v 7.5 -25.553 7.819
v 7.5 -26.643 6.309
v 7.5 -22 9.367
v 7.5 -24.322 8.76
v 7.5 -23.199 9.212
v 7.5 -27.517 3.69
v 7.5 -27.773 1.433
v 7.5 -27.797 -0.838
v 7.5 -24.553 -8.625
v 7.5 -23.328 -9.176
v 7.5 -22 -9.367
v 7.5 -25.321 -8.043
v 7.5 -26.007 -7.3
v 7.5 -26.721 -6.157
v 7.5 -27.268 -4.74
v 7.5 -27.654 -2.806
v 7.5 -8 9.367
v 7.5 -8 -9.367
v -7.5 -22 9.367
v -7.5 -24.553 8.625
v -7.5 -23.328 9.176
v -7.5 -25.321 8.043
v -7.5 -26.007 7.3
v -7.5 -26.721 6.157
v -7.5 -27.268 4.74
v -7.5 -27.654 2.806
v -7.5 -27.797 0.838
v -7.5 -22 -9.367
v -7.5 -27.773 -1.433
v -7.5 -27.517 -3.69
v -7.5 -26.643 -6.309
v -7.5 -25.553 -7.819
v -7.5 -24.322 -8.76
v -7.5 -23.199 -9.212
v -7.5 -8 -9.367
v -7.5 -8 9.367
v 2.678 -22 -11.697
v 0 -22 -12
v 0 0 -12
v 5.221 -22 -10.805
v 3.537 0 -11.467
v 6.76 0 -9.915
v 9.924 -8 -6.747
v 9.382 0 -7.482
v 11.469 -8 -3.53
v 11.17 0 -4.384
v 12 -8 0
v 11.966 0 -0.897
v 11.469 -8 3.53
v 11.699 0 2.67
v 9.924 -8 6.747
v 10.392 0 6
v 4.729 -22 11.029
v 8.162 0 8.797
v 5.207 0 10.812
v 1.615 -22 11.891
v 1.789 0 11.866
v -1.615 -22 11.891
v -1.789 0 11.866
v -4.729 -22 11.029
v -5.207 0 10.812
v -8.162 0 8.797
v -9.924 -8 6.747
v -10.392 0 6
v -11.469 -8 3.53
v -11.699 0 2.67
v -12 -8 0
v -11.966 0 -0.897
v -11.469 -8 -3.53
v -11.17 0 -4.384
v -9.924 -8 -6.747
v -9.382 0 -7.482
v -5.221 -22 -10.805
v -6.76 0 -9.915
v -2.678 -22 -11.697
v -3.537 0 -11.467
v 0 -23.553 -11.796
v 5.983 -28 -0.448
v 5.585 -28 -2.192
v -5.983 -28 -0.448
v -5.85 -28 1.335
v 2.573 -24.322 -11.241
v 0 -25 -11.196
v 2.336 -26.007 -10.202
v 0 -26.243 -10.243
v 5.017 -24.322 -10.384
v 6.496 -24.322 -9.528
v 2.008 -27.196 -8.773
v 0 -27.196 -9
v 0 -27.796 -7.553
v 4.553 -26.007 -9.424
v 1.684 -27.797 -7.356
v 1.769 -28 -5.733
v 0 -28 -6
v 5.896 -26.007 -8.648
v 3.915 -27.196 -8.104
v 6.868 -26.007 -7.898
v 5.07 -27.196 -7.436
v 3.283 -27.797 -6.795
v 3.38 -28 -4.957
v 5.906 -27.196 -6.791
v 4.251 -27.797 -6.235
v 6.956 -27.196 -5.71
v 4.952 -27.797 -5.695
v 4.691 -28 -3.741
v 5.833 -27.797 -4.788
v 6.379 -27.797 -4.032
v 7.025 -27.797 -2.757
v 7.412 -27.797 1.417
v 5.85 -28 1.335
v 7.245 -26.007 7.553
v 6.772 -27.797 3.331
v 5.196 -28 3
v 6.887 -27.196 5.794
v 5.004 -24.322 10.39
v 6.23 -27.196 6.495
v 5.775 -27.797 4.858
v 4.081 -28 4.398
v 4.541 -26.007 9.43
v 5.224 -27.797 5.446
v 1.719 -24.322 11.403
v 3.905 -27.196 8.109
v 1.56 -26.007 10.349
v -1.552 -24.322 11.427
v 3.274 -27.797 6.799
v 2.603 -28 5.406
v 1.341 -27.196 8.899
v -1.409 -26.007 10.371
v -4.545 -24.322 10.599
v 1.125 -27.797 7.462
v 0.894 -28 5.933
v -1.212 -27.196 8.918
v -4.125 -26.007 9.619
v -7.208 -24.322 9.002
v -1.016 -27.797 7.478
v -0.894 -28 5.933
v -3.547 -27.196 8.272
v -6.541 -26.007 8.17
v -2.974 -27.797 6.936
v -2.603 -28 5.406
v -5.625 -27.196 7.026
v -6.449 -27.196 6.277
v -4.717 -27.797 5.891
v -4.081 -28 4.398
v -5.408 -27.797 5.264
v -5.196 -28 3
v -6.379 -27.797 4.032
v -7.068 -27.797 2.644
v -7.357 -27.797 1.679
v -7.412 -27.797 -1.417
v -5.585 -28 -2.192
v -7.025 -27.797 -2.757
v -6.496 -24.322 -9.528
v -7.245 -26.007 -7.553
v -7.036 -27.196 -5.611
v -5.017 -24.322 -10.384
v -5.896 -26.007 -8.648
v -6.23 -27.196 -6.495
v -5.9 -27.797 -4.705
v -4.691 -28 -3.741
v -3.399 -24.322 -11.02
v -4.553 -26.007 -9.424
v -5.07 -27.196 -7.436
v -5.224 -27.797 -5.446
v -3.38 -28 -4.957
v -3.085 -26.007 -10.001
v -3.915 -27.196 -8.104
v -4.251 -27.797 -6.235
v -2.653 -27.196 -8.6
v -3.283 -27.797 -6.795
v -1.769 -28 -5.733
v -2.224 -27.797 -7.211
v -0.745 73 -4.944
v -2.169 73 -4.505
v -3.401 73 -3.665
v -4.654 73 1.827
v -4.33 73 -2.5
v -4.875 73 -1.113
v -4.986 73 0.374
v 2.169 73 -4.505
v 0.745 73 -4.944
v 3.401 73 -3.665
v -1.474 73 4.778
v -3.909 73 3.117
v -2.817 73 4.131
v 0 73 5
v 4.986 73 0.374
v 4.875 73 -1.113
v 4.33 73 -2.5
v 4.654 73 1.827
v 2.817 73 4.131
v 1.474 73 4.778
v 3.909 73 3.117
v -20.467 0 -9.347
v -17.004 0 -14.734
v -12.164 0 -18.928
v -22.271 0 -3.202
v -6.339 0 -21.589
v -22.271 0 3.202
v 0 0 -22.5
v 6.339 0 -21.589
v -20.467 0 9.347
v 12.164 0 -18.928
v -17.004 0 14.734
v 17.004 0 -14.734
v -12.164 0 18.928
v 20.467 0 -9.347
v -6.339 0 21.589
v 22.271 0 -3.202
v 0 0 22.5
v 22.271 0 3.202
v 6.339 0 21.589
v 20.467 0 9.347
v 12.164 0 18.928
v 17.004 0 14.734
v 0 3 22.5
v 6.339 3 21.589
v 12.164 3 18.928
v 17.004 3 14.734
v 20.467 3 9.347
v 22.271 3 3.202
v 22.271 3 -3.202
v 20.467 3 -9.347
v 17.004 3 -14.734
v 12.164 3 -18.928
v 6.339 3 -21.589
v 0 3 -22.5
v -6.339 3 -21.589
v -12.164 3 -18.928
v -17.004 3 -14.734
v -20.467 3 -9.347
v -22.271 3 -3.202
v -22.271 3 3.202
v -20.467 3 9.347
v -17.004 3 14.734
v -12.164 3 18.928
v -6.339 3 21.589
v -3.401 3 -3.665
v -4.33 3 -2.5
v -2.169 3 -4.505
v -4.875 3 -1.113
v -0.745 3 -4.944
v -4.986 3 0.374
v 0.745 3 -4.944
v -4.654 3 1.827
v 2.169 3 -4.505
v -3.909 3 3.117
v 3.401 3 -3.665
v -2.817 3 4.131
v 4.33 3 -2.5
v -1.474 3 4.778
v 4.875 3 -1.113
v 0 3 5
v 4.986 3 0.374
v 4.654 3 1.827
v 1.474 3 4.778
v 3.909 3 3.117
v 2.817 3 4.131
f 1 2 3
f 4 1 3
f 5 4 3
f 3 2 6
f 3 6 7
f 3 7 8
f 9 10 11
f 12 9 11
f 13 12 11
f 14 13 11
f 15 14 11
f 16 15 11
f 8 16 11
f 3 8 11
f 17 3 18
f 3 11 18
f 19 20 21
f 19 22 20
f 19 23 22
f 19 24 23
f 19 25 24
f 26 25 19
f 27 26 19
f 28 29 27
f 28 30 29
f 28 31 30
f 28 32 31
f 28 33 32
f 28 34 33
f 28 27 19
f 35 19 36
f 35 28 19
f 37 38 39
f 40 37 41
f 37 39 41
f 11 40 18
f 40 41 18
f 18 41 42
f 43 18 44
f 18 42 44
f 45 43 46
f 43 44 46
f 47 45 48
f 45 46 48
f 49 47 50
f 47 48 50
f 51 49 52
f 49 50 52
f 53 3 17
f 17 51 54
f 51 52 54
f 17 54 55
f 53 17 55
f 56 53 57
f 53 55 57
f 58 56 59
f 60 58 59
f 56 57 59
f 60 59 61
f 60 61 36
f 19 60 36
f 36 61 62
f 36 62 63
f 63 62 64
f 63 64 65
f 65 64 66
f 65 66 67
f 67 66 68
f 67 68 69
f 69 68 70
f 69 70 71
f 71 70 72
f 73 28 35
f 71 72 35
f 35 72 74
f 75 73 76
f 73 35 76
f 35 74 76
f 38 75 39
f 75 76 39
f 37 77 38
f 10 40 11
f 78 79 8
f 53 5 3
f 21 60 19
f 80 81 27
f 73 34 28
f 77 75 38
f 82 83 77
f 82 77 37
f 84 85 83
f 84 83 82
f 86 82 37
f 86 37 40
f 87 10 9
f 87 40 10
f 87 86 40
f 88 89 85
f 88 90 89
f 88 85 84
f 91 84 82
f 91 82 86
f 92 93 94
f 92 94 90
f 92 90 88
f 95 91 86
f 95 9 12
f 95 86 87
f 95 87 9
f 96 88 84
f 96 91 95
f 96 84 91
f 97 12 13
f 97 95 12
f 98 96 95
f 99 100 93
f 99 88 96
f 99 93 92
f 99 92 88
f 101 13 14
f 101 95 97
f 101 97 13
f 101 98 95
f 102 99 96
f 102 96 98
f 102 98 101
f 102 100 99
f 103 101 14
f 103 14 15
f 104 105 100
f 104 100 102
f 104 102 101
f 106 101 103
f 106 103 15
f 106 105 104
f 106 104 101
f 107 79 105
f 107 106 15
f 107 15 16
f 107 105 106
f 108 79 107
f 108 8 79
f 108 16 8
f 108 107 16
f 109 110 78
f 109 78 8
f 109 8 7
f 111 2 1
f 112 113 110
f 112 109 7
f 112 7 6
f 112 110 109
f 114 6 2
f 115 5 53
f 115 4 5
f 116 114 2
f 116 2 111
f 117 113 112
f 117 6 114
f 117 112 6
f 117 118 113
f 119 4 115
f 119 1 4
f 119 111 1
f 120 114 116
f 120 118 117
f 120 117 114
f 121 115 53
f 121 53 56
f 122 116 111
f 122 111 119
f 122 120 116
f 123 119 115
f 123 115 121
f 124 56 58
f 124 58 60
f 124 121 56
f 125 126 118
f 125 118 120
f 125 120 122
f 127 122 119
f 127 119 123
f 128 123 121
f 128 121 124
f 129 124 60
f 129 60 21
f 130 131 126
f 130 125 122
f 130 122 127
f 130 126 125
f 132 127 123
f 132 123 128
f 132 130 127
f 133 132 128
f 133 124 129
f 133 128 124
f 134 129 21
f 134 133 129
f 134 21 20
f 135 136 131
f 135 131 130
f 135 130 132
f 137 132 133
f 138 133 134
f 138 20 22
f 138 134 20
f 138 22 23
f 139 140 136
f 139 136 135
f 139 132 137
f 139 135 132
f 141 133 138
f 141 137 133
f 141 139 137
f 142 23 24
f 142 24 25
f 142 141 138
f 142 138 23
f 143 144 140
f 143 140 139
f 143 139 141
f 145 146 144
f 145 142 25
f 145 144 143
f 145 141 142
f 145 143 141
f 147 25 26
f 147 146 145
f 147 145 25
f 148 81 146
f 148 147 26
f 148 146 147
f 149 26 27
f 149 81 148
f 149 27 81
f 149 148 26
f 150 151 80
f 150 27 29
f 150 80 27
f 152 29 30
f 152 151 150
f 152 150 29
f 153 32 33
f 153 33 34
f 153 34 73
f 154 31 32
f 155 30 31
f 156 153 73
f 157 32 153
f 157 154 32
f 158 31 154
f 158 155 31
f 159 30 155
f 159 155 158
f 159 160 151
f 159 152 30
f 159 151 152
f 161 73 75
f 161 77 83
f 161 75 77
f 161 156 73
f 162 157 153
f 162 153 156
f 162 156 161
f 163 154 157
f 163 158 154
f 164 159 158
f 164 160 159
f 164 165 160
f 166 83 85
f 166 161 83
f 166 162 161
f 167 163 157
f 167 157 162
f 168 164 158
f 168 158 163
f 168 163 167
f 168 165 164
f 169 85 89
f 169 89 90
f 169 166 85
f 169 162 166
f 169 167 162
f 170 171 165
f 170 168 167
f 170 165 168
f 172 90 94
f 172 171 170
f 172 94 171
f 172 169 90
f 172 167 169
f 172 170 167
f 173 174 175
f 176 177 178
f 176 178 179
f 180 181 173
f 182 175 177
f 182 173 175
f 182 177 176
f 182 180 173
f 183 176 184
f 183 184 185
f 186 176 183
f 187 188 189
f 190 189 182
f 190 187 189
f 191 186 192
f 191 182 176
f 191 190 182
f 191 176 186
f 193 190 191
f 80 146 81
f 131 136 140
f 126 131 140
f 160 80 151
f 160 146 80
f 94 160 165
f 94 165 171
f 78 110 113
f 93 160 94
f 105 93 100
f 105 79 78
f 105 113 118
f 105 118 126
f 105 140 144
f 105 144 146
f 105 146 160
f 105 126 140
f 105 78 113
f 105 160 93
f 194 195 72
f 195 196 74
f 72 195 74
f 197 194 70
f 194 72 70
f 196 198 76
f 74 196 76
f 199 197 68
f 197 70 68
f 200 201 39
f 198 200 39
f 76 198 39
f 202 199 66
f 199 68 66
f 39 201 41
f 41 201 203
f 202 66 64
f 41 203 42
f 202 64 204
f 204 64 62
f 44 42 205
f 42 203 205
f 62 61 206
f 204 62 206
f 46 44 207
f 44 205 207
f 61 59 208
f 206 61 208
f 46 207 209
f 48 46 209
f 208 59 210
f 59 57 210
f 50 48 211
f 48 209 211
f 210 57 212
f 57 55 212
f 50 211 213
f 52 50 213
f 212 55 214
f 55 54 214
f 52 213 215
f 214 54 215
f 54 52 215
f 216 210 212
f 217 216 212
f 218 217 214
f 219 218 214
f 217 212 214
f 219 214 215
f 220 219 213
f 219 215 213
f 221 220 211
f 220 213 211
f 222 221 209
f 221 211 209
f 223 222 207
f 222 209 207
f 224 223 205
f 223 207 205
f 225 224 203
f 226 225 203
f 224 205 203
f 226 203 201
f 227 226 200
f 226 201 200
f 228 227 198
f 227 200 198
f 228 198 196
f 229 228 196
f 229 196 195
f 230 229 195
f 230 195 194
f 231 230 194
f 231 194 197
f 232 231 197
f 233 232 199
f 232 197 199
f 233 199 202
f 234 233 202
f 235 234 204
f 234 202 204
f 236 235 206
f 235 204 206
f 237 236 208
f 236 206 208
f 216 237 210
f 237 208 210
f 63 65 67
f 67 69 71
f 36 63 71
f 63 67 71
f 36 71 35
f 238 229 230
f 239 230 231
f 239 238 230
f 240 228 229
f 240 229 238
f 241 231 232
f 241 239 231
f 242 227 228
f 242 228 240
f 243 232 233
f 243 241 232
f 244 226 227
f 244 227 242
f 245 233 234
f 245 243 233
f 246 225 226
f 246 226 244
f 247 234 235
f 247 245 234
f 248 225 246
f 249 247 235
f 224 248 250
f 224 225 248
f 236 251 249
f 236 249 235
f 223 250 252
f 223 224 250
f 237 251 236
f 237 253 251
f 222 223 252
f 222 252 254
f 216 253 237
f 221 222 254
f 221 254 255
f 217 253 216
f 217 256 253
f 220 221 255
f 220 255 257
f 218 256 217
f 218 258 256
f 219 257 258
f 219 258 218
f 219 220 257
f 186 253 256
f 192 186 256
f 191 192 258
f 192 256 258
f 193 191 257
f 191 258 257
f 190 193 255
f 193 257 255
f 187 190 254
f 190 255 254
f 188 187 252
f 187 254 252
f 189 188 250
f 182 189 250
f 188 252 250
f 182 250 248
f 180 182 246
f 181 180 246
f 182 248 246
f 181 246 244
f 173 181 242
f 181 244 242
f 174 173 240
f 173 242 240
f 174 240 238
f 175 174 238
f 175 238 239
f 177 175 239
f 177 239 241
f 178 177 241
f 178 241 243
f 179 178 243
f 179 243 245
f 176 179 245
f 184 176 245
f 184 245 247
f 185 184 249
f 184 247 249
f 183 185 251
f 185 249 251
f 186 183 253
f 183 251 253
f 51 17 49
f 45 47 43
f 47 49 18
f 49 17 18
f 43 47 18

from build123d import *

# Parameters (mm, degrees)
SKETCH1_R               = 22.5
BOSS_EXTRUDE1_DEPTH     = 3
SKETCH2_R               = 5
BOSS_EXTRUDE2_DEPTH     = 70
SKETCH3_R               = 12
BOSS_EXTRUDE3_DEPTH     = 28
FILLET1_R               = 6
CUT_EXTRUDE1_DEPTH      = 80.633535649
CUT_EXTRUDE1_DEPTH_BACK = 80.633535649
SKETCH4_W               = 19.57
SKETCH4_H               = 20


with BuildPart() as part:
    # Sketch1 → Boss-Extrude1 (new body)
    with BuildSketch(Plane(origin=(0, 0, 0), x_dir=(1, 0, 0), z_dir=(0, 1, 0))):
        with Locations(Location((0, 0, 0), (0, 0, 270))):
            Circle(SKETCH1_R)
    extrude(amount=BOSS_EXTRUDE1_DEPTH)

    # Sketch2 → Boss-Extrude2 (add)
    with BuildSketch(Plane(origin=(0, 3, 0), x_dir=(1, 0, 0), z_dir=(0, 1, 0))):
        with Locations(Location((0, 0, 0), (0, 0, 270))):
            Circle(SKETCH2_R)
    extrude(amount=BOSS_EXTRUDE2_DEPTH)

    # Sketch3 → Boss-Extrude3 (add)
    with BuildSketch(Plane.XZ):
        with Locations(Location((0, 0, 0), (0, 0, 270))):
            Circle(SKETCH3_R)
    extrude(amount=BOSS_EXTRUDE3_DEPTH)

    # Fillet1
    fillet1_edges = [part.edges().sort_by_distance(p)[0] for p in [
        (0, -28, 12),
    ]]
    fillet(fillet1_edges, radius=FILLET1_R)

    # Sketch4 → Cut-Extrude1 (cut, two sides: drawn at the far end of the back side and taken through both)
    with BuildSketch(Plane.XY.offset(-CUT_EXTRUDE1_DEPTH_BACK)):
        with Locations((17.285, -18)):
            Rectangle(SKETCH4_W, SKETCH4_H)
        with Locations((-17.285, -18)):
            Rectangle(SKETCH4_W, SKETCH4_H)
    extrude(amount=CUT_EXTRUDE1_DEPTH + CUT_EXTRUDE1_DEPTH_BACK, mode=Mode.SUBTRACT)


solid = part.part
